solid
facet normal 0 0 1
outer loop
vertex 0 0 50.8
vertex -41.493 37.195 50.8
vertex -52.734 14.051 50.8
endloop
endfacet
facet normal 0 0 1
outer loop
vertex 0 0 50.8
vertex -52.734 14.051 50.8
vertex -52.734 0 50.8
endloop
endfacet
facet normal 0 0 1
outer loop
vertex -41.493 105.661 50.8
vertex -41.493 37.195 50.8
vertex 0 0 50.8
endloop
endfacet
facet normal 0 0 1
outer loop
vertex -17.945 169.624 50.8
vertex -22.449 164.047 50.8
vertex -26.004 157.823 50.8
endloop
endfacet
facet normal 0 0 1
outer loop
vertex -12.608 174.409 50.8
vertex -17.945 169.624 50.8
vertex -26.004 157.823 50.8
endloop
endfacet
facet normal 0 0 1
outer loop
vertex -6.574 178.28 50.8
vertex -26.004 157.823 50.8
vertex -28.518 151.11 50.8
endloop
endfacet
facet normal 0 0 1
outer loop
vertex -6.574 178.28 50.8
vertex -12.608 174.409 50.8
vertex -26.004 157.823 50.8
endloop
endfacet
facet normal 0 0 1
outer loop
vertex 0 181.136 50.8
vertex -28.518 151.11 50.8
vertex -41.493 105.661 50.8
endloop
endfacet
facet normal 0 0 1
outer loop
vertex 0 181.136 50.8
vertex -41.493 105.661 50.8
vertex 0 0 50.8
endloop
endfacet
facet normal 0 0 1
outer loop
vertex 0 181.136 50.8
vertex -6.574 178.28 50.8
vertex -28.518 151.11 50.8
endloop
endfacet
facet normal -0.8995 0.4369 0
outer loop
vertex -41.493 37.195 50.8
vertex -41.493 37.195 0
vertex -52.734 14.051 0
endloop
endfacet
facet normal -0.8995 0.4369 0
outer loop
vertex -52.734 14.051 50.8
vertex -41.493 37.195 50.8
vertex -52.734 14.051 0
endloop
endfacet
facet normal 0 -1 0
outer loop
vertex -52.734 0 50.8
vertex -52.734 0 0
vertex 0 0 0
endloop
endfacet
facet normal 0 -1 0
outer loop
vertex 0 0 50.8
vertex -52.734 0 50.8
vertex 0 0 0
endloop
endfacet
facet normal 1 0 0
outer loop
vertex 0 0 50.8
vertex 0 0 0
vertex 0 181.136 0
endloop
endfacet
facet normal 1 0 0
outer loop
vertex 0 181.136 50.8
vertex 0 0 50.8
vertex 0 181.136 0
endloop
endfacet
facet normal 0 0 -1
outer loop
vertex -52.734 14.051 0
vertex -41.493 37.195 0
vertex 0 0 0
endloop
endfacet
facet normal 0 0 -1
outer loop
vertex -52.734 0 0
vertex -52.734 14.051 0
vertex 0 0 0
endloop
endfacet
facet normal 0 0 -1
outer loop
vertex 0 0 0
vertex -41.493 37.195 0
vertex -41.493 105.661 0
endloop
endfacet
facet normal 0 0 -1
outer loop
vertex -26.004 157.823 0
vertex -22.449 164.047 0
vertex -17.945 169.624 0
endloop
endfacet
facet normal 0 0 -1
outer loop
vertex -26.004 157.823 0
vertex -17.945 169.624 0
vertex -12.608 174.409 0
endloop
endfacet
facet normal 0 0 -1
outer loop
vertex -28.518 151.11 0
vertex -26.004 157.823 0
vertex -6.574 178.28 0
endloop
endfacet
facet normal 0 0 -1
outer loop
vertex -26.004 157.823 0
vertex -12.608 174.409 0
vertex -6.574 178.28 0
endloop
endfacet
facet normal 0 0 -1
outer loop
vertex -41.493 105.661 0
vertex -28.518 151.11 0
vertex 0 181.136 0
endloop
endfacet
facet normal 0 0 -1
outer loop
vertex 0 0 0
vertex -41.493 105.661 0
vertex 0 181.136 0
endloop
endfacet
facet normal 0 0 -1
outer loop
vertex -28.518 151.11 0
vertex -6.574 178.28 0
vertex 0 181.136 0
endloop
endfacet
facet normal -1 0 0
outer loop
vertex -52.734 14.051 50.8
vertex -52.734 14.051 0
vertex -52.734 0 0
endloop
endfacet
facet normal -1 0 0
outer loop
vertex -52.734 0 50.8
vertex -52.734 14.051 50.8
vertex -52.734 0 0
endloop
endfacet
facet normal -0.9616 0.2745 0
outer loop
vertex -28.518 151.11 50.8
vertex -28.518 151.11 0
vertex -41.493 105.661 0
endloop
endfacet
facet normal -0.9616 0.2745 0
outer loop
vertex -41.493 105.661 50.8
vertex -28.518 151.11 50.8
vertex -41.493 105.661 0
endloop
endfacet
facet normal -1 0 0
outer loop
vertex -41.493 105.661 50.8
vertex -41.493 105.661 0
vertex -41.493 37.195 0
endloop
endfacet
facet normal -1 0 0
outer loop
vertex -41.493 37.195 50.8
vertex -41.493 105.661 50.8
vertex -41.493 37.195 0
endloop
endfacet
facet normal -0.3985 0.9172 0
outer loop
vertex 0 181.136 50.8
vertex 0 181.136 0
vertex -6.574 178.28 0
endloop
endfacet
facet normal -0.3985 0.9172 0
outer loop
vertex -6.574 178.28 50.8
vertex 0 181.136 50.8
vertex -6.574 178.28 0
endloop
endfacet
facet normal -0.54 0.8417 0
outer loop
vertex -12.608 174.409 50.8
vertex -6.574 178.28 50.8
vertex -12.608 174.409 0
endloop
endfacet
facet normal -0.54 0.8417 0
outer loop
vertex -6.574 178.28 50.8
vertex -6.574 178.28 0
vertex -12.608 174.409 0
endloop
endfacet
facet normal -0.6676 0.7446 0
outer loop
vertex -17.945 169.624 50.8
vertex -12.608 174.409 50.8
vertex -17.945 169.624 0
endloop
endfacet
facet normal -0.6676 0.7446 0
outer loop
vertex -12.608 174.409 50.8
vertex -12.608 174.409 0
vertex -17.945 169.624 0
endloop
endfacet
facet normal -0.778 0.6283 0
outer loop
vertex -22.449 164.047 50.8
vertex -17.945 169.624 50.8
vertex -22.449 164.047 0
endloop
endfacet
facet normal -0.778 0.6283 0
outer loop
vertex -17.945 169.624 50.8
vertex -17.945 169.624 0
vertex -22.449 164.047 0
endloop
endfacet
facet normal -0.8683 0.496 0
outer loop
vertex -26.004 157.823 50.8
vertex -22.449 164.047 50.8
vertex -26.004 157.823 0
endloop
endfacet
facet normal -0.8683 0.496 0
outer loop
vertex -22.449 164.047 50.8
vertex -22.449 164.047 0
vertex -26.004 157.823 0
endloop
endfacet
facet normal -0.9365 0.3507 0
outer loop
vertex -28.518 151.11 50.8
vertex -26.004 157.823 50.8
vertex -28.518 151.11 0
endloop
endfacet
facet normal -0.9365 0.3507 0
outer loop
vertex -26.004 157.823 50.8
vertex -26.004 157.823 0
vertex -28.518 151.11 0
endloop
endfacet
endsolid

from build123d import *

# Parameters (mm, degrees)
F1_DEPTH = 50.8


with BuildPart() as f1:
    # F0 (on Top) → F1 (new body)
    with BuildSketch(Plane.XY):
        with BuildLine():
            Line((-52.733865, 0), (0, 0))
            Line((0, 0), (0, 181.136057))
            ThreePointArc((0, 181.136057), (-17.94511, 169.62391), (-28.517708, 151.109681))
            Line((-28.517708, 151.109681), (-41.49279, 105.66102))
            Line((-41.49279, 105.66102), (-41.49279, 37.194733))
            Line((-41.49279, 37.194733), (-52.733865, 14.051343))
            Line((-52.733865, 14.051343), (-52.733865, 0))
        make_face()
    extrude(amount=F1_DEPTH)


solid = f1.part
